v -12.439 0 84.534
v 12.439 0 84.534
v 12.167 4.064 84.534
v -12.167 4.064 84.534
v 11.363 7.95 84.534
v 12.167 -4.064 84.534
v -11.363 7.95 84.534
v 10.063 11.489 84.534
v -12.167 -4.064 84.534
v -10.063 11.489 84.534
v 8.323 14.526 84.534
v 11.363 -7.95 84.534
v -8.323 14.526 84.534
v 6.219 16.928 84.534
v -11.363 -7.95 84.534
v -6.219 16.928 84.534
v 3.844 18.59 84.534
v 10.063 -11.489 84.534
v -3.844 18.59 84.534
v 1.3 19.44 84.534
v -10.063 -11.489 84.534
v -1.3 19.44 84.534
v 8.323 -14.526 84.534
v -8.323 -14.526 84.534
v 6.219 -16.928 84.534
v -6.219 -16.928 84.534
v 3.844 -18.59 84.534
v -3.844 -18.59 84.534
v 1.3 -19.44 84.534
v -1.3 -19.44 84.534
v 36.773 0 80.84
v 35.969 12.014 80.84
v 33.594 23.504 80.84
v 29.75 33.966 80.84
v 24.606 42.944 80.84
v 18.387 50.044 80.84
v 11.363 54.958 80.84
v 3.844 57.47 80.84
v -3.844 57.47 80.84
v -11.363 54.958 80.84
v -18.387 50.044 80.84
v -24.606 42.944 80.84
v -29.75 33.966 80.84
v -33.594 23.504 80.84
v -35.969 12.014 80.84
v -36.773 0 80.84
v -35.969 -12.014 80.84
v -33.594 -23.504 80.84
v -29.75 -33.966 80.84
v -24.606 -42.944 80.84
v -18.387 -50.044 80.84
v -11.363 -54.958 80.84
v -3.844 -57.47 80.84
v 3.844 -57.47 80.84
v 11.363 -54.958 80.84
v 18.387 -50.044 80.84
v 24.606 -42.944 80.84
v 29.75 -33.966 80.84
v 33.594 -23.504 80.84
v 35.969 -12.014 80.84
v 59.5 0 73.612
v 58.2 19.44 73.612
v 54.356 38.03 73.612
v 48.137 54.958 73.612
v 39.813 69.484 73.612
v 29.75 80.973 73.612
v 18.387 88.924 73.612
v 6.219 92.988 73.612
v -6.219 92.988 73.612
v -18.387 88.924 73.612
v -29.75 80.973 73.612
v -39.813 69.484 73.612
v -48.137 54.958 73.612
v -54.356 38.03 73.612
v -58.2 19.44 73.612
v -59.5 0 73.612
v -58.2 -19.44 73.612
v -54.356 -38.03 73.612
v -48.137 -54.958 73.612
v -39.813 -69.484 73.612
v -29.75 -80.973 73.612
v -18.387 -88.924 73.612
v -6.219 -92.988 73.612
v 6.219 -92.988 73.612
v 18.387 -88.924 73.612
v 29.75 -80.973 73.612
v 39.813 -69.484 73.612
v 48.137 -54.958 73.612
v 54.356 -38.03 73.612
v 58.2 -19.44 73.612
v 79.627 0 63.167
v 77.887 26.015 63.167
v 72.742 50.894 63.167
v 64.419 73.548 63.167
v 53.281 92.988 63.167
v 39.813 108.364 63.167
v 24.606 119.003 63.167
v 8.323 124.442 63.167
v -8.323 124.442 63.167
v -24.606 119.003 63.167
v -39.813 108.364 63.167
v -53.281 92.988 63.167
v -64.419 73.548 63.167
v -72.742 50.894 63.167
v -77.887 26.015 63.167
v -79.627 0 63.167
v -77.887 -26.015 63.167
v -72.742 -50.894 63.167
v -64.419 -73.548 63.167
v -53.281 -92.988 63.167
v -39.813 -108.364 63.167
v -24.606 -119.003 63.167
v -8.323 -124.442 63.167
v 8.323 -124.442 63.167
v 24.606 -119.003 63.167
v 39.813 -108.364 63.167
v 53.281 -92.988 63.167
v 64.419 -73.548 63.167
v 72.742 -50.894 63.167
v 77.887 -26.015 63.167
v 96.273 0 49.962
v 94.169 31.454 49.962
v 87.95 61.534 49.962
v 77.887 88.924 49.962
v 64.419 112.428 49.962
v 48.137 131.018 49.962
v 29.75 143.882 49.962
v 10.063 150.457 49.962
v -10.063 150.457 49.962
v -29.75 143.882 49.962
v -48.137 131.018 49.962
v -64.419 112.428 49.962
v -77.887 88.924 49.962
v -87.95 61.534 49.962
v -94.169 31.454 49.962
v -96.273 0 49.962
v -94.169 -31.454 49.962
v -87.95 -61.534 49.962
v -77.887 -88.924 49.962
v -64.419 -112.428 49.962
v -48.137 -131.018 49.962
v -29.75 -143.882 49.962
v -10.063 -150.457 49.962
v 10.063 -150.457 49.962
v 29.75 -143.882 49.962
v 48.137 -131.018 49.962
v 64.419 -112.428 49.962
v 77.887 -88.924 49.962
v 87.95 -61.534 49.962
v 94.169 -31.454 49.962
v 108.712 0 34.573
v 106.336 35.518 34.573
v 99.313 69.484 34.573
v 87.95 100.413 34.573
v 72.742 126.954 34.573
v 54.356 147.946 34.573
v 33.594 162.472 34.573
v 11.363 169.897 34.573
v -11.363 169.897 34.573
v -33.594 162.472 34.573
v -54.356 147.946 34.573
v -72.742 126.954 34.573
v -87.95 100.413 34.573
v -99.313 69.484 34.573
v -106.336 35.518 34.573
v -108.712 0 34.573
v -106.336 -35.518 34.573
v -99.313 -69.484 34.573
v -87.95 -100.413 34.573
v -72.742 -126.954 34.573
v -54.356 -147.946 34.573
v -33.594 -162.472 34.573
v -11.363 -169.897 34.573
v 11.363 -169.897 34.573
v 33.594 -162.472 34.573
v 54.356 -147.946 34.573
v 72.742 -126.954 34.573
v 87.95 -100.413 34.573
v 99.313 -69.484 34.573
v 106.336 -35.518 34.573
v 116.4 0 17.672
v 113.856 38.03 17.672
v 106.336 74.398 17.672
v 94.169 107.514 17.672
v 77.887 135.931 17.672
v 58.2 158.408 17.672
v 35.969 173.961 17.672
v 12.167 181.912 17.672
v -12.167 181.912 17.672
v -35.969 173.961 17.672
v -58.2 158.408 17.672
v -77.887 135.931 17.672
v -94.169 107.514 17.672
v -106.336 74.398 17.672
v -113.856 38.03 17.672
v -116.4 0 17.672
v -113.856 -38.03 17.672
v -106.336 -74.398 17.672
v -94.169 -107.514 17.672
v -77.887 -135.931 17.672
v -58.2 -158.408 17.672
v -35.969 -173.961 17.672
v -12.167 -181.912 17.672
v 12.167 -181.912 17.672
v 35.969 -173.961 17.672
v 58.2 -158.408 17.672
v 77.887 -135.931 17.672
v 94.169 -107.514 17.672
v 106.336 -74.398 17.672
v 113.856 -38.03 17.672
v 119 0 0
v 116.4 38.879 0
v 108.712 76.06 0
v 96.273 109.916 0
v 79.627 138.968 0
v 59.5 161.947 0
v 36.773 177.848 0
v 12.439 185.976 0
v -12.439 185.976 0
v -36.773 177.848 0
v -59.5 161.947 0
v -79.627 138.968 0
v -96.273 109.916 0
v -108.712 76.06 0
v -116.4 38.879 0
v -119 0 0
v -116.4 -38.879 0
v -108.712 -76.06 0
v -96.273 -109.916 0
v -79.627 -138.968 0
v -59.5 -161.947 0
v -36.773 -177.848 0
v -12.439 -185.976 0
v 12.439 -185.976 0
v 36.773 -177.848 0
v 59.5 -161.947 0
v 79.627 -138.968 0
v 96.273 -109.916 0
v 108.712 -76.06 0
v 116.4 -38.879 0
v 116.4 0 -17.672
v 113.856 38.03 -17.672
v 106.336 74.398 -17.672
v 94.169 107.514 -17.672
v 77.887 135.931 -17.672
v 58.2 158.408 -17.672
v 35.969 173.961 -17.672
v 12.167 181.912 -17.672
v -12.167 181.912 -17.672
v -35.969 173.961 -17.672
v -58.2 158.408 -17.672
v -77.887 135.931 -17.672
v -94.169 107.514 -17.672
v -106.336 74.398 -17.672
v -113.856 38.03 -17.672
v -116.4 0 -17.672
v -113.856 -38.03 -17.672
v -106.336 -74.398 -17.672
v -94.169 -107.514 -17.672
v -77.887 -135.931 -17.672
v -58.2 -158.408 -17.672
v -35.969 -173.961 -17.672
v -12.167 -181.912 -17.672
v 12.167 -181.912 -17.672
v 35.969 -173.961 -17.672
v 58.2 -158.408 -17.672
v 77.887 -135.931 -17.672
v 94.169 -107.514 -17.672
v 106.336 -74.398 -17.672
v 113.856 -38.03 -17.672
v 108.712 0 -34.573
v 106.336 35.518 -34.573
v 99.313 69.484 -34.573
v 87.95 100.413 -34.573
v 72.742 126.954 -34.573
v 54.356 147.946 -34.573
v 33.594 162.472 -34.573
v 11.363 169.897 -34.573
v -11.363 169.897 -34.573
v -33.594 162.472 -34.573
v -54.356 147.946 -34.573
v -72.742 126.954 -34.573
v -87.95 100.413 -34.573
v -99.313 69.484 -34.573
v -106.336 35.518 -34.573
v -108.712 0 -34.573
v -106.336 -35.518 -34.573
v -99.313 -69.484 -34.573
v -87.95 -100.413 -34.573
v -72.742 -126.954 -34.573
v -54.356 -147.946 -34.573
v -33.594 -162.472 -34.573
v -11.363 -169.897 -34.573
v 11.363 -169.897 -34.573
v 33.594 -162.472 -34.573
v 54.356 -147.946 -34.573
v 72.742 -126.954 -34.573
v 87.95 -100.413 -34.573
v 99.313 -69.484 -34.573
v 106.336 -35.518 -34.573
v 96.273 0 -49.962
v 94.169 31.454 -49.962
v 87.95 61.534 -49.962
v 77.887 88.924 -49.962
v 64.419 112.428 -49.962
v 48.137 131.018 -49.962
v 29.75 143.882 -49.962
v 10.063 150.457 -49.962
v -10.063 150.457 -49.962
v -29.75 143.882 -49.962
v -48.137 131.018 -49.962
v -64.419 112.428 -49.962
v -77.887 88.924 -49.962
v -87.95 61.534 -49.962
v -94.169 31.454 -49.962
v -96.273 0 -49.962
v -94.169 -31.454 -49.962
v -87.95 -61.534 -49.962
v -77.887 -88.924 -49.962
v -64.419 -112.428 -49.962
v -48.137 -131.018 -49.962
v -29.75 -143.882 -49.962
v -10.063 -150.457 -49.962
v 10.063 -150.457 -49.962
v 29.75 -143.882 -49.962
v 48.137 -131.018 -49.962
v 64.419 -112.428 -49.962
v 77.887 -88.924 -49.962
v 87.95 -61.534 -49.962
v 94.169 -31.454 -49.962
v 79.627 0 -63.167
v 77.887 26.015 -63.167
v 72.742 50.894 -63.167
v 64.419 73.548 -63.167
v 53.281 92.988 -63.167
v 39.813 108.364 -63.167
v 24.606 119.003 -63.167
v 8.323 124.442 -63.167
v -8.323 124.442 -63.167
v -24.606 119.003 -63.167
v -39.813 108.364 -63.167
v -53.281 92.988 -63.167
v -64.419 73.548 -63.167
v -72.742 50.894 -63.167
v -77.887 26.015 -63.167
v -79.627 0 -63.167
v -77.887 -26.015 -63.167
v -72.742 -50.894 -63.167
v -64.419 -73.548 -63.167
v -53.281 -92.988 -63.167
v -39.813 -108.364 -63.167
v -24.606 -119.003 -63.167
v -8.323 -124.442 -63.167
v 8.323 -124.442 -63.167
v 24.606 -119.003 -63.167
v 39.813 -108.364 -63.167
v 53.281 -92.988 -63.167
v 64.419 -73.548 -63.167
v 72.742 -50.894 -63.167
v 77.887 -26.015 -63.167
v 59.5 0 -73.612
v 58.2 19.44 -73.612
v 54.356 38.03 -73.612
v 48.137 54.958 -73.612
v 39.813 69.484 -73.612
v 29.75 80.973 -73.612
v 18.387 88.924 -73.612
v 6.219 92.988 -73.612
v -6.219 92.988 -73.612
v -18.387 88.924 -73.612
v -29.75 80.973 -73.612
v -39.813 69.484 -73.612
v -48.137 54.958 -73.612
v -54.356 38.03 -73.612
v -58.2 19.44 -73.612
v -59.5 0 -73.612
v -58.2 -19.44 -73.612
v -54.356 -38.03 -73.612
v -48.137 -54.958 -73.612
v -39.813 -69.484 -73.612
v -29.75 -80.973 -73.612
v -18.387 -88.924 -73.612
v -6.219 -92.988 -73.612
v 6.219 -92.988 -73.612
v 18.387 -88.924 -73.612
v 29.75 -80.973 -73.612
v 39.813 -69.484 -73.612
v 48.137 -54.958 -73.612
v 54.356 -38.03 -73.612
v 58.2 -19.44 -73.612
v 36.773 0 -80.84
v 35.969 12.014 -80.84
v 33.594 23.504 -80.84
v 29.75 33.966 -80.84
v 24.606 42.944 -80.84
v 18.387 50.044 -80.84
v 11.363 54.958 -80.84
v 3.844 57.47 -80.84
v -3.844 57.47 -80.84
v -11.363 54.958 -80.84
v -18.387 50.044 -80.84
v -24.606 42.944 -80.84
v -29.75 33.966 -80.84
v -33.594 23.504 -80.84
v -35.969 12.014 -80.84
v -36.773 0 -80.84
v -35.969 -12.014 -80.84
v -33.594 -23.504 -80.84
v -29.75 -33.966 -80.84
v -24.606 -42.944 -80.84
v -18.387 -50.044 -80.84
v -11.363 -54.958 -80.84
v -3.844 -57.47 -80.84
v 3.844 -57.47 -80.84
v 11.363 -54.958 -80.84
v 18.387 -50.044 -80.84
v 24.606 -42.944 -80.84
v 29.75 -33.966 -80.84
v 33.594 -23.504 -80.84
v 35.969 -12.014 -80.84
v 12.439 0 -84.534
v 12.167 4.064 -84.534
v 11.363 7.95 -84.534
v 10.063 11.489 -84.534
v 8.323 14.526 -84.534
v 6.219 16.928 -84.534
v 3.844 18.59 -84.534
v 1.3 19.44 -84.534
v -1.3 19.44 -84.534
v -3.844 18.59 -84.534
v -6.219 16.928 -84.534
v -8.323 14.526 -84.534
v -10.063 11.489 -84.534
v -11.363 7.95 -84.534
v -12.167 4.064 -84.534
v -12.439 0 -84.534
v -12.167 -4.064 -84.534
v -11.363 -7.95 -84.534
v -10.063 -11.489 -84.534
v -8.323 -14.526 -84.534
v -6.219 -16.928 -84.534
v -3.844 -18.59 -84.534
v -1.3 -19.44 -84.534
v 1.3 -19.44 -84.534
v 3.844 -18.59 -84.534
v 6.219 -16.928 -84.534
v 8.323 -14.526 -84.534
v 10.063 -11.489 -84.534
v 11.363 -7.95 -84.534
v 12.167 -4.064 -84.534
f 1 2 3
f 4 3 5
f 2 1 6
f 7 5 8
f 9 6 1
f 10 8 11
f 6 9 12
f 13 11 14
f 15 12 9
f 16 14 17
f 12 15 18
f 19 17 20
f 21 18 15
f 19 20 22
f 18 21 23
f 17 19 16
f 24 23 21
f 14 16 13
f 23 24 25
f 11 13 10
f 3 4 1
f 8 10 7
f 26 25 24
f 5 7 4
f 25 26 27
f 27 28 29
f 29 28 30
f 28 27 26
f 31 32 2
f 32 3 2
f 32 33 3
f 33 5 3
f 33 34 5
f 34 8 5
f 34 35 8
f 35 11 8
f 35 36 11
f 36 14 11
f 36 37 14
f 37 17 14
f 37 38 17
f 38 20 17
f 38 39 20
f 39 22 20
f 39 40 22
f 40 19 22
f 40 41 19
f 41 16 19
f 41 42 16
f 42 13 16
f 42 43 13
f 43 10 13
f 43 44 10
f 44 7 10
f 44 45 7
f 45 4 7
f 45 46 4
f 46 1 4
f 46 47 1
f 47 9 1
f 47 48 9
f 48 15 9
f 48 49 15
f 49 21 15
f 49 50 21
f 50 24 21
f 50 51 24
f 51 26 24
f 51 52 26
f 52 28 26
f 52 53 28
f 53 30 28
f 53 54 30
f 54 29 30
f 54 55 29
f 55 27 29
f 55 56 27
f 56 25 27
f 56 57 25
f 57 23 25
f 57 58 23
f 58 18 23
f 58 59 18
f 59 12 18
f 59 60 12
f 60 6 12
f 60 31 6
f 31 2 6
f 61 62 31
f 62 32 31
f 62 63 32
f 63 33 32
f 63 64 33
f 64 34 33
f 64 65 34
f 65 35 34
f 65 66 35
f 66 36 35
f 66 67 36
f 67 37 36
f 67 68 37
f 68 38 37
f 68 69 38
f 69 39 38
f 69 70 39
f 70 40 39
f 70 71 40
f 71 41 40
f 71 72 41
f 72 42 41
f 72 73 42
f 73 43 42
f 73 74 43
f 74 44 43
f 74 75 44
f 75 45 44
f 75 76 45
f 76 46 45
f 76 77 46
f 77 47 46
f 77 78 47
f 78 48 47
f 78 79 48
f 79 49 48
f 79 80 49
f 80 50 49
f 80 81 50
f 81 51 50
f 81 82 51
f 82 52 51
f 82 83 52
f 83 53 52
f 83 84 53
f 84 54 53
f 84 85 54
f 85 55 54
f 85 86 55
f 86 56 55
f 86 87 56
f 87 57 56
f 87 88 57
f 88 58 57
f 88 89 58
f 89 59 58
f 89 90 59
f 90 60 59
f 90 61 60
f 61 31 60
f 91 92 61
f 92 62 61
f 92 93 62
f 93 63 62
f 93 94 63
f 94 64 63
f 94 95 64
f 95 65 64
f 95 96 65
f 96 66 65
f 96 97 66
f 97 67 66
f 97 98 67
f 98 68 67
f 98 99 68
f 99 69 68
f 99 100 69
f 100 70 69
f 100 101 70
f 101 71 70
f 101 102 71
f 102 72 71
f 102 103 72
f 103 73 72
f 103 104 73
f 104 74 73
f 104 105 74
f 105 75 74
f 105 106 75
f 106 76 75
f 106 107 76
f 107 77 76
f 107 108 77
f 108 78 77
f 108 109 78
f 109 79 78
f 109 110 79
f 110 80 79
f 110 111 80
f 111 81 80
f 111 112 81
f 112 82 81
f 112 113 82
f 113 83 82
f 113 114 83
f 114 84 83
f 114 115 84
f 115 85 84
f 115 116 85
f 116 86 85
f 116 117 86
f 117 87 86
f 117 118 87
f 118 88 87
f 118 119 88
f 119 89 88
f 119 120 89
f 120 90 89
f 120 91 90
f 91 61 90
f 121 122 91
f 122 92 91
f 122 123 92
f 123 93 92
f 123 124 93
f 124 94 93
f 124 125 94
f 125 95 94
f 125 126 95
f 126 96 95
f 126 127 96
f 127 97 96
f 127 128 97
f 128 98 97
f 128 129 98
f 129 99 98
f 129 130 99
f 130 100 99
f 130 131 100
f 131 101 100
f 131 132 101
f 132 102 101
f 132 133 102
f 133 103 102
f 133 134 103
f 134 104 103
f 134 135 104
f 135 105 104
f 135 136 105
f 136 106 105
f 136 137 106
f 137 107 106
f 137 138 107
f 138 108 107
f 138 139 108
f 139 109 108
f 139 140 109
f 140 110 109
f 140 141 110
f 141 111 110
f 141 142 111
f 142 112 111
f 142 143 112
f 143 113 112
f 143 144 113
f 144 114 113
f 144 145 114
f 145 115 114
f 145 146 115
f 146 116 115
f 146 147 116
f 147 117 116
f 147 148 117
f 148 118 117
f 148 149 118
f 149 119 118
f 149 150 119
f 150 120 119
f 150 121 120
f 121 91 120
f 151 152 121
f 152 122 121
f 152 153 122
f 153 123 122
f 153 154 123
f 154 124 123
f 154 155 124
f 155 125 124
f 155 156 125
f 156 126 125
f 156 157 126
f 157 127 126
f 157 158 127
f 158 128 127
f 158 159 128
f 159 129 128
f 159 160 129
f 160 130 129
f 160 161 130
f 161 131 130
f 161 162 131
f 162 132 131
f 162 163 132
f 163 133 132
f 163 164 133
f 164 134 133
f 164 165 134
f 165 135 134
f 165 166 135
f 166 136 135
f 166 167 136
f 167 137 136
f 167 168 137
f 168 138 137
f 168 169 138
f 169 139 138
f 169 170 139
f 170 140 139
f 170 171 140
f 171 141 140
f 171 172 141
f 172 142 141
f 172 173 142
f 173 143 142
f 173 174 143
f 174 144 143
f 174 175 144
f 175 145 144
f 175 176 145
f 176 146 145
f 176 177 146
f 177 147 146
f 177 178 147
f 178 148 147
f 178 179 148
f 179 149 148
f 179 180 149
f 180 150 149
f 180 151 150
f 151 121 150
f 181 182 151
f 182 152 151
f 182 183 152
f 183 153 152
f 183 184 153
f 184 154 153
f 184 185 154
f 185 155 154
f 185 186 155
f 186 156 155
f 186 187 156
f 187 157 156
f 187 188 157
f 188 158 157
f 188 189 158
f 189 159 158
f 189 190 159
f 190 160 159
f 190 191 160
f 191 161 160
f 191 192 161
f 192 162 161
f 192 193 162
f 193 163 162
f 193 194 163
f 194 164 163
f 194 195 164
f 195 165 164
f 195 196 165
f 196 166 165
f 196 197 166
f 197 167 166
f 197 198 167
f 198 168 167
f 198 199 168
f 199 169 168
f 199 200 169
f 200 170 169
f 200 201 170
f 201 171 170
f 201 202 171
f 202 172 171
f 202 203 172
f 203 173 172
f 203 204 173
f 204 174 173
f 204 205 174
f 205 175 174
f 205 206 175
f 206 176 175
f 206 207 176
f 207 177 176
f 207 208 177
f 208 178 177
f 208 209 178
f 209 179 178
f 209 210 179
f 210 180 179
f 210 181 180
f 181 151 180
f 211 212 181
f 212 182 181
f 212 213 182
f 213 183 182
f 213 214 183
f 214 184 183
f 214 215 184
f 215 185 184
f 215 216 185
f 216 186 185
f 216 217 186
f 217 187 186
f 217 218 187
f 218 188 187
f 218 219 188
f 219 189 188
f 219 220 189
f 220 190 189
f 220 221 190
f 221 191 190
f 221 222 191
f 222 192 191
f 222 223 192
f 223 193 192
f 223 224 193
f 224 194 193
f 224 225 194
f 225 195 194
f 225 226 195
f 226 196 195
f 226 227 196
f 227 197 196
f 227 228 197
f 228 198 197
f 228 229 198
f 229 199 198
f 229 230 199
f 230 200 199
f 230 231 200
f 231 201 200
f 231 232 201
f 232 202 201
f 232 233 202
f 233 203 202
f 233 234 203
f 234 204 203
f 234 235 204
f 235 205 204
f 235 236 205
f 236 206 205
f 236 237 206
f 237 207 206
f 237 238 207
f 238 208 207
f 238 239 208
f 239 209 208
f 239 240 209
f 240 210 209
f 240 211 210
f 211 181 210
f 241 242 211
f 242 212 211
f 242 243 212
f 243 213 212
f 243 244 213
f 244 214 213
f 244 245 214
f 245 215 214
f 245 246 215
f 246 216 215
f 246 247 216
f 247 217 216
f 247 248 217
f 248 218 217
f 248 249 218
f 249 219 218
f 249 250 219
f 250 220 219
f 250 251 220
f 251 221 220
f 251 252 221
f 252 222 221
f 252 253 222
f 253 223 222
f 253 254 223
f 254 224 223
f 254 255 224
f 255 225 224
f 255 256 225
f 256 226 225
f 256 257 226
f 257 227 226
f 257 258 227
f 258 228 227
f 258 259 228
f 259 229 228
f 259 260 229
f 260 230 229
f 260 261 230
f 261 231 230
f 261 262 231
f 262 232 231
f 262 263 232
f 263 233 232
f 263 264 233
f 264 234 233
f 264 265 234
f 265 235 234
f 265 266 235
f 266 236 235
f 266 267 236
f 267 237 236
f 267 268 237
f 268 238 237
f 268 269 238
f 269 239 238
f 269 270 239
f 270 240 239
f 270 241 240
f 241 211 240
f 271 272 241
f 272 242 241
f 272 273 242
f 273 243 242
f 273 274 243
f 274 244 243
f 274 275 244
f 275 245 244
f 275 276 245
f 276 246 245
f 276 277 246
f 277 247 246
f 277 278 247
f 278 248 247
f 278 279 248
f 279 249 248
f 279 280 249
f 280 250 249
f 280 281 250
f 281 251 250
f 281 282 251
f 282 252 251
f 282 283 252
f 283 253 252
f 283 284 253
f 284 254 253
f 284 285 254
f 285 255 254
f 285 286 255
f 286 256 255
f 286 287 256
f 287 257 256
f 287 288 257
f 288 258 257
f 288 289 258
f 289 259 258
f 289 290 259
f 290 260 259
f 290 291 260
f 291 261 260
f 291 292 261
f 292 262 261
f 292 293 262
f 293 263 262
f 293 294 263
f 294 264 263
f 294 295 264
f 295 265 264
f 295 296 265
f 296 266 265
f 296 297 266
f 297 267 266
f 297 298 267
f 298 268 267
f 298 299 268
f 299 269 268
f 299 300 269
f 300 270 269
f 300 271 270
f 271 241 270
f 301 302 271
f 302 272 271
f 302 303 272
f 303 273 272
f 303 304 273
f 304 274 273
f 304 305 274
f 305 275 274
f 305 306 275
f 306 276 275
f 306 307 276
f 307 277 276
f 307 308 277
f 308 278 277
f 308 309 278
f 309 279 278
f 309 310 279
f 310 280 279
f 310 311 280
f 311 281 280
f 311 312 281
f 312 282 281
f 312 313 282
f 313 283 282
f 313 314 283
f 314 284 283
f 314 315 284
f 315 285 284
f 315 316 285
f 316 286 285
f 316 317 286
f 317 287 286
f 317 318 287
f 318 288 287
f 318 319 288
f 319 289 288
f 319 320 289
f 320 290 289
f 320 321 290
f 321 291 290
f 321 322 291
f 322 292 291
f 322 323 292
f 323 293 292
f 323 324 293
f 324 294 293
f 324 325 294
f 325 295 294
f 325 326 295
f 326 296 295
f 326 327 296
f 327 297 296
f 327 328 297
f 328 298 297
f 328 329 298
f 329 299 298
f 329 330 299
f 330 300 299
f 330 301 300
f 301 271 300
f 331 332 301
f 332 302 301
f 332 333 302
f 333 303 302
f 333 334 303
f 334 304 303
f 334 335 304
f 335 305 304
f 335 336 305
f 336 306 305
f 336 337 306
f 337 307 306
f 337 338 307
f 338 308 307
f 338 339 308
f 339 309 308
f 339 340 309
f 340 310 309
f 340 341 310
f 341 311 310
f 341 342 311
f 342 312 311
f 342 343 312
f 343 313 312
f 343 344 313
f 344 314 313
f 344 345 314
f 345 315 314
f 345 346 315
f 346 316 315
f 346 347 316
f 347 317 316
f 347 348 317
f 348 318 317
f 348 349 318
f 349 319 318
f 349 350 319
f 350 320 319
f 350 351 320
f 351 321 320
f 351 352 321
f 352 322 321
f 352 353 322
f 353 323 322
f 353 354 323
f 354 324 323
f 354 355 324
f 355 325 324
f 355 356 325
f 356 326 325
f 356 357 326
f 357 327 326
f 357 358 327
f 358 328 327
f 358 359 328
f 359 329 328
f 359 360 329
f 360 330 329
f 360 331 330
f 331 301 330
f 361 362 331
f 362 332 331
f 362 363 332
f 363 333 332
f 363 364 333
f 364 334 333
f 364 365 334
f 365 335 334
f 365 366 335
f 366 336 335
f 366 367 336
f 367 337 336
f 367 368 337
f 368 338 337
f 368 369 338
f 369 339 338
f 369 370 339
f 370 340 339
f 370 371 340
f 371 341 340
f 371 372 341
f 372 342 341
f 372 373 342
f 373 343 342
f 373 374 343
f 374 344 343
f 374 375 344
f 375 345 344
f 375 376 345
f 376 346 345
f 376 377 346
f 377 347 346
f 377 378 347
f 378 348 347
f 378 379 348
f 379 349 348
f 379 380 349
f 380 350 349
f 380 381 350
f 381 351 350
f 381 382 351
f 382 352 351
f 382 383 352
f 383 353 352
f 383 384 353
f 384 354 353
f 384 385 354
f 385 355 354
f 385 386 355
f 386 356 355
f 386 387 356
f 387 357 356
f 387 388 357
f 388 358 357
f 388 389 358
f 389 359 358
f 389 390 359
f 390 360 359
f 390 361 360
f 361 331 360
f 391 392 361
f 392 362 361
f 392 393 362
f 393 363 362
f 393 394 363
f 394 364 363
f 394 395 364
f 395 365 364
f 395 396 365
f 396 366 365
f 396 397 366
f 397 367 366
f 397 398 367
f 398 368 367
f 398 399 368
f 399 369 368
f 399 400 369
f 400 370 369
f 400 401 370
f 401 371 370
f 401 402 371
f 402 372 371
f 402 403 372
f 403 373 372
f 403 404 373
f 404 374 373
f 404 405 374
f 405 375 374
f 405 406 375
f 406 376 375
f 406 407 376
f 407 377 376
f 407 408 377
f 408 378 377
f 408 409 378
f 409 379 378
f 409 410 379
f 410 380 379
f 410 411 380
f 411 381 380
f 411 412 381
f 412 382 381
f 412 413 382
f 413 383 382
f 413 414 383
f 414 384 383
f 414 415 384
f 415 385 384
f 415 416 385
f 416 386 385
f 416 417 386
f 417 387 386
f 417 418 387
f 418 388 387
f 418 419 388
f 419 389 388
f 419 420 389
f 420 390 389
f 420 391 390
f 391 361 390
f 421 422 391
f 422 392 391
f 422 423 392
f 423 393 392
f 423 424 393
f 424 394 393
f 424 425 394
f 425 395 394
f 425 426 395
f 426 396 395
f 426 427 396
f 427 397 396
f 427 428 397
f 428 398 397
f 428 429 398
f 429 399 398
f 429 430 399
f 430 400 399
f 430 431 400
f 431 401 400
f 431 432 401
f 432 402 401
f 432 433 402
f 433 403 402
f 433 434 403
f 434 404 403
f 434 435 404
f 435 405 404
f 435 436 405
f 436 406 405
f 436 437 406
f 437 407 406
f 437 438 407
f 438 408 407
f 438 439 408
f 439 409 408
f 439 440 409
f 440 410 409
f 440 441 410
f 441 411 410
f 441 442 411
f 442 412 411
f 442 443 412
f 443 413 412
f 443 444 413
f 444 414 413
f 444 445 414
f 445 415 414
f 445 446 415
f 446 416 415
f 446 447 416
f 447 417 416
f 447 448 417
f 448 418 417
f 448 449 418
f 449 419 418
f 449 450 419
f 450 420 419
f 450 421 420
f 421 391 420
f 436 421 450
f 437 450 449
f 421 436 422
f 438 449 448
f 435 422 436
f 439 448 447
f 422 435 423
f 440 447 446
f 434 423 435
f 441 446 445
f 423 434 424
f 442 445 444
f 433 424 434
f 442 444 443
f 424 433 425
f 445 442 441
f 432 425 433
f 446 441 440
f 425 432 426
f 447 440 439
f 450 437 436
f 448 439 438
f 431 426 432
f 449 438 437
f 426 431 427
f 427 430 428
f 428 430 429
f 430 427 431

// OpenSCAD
// Generated by SolidPython 1.0.1 on 2020-07-29 00:46:47


scale(v = [7, 11, 5]) {
	sphere(r = 17);
}
/***********************************************
*********      SolidPython code:      **********
************************************************
 
# import packages: SolidPython
from solid import *
from solid.utils import *
from itertools import chain, combinations, permutations


class Resize:

    def __init__(self, scad_file):
        self.scad_file = scad_file
        #self.scad_file = import_scad(scad_file)
        # cone/cylinder param:
        self.r1 = 0
        self.r2 = 0
        self.h = 0
        # rectangular prism param:
        self.w = 0
        self.l = 0
        # ellipse param:
        self.r = 0

    # import OpenScad code (file name corresponds to shape)


    # classify shape + parameters
    def assign(self, param1, param2, param3):
        if self.scad_file == 'cone.scad':
            self.r1 = param1
            self.r2 = param2
            self.h = param3
        elif self.scad_file == 'cylinder.scad':
            self.r1 = param1
            self.r2 = param2
            self.h = param3
        elif self.scad_file == 'rectangularPrism.scad':
            self.h = param1
            self.l = param2
            self.w = param3
        else:
            self.r = param1
            self.h = param2

    # resize parameters
    def iterate(self):
        x = range(3, 20, 2)
        i = 1
        if self.scad_file == 'cone.scad':
            tempList = list(permutations(x, 2))
            for temp in tempList:
                param1 = temp[0]
                param2 = temp[1]
                filepath = 'produced_scad_files/' + 'cone' + str(param1) + '_' + str(param2) + '_' + '.scad'
                scad_render_to_file(cylinder(h=param1, r1=param2, r2=0), filepath)

        elif self.scad_file == 'cylinder.scad':
            tempList = list(permutations(x, 3))
            for temp in tempList:
                param1 = temp[0]
                param2 = temp[1]
                filepath = 'produced_scad_files/' + 'cylinder' + str(param1) + '_' + str(param2) + '_' + '.scad'
                scad_render_to_file(cylinder(h=param1, r1=param2, r2=param2), filepath)

        elif self.scad_file == 'rectangularPrism.scad':
            tempList = list(permutations(x, 3))
            for temp in tempList:
                param1 = temp[0]
                param2 = temp[1]
                param3 = temp[2]
                filepath = 'produced_scad_files/' + 'rectangularPrism' + str(param1) + '_' + str(param2) + '_' + str(
                    param3) + '.scad'
                scad_render_to_file(cube(size=(param1, param2, param3)), filepath)

        elif self.scad_file == 'ellipse.scad':
            tempList = list(permutations(x, 4))
            for temp in tempList:
                param1 = temp[0]
                param2 = temp[1]
                param3 = temp[2]
                param4 = temp[3]
                filepath = 'produced_scad_files/' + 'ellipse' + str(param1) + '_' + str(param2) + '_' + str(param3) + '_' + str(param4) + '.scad'
                scad_render_to_file(scale([param1, param2, param3])(sphere(r=param4)), filepath)

    def render_to_scadfile(self):
        scad_render_to_file(scad, 'example.scad') 
 
************************************************/
